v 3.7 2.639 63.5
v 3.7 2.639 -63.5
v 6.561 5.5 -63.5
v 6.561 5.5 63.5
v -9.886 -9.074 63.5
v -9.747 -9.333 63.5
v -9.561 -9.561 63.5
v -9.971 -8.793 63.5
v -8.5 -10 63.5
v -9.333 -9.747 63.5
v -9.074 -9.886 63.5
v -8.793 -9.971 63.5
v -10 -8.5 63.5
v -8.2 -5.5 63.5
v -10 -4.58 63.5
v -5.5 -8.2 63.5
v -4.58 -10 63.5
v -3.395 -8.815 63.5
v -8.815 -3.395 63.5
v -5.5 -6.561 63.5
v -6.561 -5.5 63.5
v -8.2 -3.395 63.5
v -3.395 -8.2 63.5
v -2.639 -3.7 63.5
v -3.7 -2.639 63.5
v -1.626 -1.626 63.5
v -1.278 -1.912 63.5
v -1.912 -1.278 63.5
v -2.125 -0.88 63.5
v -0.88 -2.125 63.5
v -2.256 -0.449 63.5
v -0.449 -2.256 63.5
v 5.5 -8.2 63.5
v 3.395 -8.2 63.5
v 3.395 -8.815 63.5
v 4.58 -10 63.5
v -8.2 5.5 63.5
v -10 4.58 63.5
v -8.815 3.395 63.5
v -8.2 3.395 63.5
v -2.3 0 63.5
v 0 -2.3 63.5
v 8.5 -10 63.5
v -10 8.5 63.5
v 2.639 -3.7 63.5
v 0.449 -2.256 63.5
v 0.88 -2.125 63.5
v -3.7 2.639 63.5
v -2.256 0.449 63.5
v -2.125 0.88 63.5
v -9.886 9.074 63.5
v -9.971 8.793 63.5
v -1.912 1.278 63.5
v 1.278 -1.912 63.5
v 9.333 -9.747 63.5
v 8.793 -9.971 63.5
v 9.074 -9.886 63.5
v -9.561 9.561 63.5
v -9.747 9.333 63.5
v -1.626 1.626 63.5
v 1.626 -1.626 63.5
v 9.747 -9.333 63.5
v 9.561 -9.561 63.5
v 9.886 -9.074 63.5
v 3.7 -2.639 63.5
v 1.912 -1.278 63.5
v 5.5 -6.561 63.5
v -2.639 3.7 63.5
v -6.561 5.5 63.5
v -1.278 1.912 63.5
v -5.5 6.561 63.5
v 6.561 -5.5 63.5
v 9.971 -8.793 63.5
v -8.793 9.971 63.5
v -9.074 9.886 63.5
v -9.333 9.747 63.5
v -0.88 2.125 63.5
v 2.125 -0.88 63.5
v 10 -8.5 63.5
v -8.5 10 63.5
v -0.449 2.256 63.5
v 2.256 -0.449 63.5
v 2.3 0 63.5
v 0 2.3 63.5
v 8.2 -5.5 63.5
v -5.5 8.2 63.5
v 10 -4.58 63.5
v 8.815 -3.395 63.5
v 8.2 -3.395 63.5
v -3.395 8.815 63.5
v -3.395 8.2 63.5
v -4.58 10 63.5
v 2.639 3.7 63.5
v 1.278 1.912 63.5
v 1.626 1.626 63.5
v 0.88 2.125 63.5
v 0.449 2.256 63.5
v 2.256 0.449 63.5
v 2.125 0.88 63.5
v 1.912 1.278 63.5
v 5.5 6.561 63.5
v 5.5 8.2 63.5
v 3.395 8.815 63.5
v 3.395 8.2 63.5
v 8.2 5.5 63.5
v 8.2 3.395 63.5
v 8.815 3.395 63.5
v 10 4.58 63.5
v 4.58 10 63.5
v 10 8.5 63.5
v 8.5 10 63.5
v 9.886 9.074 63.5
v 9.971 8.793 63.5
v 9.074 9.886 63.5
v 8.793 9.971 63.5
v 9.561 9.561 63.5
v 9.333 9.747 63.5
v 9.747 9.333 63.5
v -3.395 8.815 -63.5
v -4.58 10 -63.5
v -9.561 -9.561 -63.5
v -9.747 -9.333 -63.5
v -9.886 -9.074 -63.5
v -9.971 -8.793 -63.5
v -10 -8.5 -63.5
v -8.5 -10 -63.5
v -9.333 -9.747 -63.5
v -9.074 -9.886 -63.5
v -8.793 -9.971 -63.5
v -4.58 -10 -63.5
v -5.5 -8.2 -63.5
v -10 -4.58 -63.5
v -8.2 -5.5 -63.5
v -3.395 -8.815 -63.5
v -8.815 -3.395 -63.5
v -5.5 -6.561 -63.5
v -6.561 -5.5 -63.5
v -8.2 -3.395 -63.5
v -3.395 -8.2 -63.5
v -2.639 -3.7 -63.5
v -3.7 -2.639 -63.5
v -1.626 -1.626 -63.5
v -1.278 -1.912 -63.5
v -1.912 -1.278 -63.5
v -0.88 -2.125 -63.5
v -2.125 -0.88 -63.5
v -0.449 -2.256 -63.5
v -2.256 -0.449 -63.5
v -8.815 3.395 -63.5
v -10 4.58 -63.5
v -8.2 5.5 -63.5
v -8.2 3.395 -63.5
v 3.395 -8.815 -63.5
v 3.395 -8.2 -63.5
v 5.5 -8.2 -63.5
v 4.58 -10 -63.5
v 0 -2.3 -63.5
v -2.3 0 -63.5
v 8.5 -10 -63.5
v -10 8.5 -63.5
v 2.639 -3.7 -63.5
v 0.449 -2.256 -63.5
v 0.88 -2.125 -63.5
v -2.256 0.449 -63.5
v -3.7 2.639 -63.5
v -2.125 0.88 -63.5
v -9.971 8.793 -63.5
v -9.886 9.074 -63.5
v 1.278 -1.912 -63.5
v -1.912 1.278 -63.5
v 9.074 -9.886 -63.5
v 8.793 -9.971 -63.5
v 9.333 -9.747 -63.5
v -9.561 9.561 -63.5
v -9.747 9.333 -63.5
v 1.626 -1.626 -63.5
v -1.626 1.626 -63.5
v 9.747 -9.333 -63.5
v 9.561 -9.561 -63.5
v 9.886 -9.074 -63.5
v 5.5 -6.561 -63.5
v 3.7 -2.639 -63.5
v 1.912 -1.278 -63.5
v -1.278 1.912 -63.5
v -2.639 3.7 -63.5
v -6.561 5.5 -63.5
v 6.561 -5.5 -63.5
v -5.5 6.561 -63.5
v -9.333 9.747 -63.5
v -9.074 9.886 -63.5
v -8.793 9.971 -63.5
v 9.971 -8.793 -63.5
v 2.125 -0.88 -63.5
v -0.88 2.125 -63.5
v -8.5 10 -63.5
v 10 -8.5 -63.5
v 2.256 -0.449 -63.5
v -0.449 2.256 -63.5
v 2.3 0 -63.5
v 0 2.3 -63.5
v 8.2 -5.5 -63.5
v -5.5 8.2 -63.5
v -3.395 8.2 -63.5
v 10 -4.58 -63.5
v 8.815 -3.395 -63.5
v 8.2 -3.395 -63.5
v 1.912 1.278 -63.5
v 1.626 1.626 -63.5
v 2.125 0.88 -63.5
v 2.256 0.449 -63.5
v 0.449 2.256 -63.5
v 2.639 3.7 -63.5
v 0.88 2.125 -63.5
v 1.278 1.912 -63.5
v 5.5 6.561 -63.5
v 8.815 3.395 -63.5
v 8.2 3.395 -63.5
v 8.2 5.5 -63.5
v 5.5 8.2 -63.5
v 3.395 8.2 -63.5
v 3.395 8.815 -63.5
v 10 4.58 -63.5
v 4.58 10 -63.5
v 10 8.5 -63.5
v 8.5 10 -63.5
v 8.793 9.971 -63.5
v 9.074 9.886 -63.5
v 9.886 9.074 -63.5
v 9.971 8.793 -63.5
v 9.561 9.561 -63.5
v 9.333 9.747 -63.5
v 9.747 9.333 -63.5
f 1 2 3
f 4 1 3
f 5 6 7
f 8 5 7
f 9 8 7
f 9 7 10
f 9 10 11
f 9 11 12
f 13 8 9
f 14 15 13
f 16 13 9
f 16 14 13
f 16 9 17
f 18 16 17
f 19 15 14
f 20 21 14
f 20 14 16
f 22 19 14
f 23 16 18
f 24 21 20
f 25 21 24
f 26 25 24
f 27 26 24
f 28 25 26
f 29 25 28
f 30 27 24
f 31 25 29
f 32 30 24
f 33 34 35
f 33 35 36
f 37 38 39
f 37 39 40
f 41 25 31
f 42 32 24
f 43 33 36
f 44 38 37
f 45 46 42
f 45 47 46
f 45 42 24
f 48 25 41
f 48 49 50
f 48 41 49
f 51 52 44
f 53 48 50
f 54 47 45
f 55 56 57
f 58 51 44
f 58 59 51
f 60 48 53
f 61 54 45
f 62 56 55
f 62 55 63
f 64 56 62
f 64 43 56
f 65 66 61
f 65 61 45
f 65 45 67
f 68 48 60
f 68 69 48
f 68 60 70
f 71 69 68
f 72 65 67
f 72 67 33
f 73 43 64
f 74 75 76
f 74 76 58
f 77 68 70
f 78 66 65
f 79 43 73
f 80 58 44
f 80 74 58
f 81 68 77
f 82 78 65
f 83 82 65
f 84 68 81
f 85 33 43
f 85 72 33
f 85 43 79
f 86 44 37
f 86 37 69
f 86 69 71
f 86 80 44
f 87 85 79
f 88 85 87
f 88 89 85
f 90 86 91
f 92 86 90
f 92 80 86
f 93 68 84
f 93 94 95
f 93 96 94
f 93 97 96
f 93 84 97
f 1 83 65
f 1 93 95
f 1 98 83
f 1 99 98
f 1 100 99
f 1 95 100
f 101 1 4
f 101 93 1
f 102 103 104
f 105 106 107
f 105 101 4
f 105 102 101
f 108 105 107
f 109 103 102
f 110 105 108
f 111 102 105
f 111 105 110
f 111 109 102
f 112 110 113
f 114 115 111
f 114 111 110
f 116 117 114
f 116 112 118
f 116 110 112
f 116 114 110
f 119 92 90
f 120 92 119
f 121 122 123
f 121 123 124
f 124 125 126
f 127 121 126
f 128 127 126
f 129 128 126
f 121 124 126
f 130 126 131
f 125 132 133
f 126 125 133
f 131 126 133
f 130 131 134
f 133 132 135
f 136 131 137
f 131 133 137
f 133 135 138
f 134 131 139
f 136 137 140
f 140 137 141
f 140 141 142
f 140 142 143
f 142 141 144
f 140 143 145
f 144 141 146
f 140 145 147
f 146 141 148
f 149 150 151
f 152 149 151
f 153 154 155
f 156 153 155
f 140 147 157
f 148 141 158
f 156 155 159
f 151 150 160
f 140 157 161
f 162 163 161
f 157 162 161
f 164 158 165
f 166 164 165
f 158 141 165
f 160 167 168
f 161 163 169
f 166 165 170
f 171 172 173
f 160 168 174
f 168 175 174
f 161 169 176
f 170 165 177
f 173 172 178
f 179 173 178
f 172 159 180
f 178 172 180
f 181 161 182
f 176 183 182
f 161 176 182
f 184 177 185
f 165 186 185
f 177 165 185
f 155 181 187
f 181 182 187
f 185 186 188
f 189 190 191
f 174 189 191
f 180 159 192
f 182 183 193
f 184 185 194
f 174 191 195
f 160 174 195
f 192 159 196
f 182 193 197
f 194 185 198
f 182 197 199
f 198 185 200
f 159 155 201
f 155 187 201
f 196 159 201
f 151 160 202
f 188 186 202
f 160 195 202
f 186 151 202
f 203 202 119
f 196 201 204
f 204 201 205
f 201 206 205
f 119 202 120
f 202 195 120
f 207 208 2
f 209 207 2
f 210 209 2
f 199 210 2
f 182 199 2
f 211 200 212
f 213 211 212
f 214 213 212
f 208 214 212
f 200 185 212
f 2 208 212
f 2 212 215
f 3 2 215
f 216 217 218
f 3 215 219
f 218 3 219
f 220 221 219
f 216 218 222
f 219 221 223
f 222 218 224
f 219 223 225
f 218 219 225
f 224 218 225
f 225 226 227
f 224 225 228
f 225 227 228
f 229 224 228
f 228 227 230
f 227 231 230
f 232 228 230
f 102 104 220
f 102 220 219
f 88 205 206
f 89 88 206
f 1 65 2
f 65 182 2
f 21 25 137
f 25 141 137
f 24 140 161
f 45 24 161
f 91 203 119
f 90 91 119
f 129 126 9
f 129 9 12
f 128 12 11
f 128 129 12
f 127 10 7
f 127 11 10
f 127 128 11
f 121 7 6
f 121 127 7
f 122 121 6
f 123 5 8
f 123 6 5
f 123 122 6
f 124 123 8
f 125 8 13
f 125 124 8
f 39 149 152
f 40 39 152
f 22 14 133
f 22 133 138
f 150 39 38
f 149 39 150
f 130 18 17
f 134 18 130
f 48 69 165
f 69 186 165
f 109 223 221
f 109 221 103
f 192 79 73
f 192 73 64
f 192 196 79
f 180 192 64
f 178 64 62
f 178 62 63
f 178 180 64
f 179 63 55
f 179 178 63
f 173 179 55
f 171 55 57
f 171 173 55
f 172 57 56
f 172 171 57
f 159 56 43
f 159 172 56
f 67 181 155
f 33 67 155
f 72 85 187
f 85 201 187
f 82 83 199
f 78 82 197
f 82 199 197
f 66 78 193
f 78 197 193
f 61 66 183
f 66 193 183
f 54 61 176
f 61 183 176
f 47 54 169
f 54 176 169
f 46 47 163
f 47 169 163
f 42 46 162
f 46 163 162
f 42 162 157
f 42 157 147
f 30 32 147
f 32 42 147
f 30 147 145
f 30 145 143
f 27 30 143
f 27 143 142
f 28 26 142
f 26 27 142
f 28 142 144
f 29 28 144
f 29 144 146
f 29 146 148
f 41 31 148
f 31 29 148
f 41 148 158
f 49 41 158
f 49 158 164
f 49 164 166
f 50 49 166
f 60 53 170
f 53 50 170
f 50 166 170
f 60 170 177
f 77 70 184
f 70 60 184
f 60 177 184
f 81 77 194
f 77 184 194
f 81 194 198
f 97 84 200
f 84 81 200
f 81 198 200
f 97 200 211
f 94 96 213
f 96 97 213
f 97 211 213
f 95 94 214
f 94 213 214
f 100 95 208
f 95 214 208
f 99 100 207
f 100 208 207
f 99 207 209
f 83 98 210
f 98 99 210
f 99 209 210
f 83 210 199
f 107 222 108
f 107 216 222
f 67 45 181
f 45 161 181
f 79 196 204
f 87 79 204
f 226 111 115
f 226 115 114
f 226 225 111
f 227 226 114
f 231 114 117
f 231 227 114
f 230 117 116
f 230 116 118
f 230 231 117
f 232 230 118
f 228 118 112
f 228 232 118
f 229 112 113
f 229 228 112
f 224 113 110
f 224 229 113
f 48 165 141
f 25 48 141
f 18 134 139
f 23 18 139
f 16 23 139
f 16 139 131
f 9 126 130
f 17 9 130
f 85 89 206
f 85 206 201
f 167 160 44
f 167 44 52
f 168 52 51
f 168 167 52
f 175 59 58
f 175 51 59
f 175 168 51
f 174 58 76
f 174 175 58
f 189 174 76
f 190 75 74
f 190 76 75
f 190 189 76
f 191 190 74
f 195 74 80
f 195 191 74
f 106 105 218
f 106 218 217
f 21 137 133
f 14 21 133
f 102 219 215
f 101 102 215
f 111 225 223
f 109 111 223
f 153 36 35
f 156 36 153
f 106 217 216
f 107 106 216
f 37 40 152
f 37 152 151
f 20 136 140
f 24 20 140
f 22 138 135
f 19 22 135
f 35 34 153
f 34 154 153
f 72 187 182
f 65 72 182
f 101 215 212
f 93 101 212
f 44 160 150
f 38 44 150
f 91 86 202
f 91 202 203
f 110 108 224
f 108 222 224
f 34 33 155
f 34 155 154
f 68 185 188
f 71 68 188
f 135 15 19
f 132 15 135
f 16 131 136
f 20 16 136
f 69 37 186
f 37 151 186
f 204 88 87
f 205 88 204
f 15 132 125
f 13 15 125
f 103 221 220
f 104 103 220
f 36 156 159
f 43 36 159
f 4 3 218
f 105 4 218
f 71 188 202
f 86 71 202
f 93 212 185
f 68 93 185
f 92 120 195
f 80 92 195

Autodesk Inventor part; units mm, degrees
ref_plane "YZ Plane" through (0, 0, 0) normal (1, 0, 0) x (0, 1, 0)
ref_plane "XZ Plane" through (0, 0, 0) normal (0, 1, 0) x (-1, 0, 0)
ref_plane "XY Plane" through (0, 0, 0) normal (0, 0, 1) x (1, 0, 0)
sketch "Sketch1" plane through (0, 0, 0) normal (0, 0, 1) x (1, 0, 0)
  line L0 (0, 3.7) -> (-2.6393, 3.7)
  line L1 (-2.6393, 3.7) -> (-5.5, 6.5607)
  line L2 (-5.5, 6.5607) -> (-5.5, 8.2)
  line L3 (-5.5, 8.2) -> (-3.395, 8.2)
  line L4 (-3.395, 8.2) -> (-3.395, 10)
  line L5 (-3.395, 10) -> (-10, 10)
  line L6 (-10, 10) -> (-10, 3.395)
  line L7 (-10, 3.395) -> (-8.2, 3.395)
  line L8 (-8.2, 3.395) -> (-8.2, 5.5)
  line L9 (-8.2, 5.5) -> (-6.5607, 5.5)
  line L10 (-6.5607, 5.5) -> (-3.7, 2.6393)
  line L11 (-3.7, 2.6393) -> (-3.7, 0)
  line L12 (0, 0) -> (-10, 10) construction
  circle A0 centre (0, 0) radius 2.3
  line L13 (-22.6601, 0) -> (65.9605, 0) projected
  line L14 (-3.7, 0) -> (0, 0)
  line L15 (0, 0) -> (0, 3.7)
  line L16 (11.2521, 18.9743) -> (53.3004, 18.9743) construction
  line L17 (53.3004, 18.9743) -> (53.3004, -5.624) construction
  line L18 (53.3004, -5.624) -> (11.2521, -5.624) construction
  line L19 (11.2521, -5.624) -> (11.2521, 18.9743) construction
  point P0 (-2.3, 0)
  point P1 (0, 2.3)
  dimension "d0" = 1.5
  dimension "d6" = 6.3
  dimension "d9" = 4.6
  dimension "d18" = 135
  dimension "d22" = 20
  dimension "d34" = 11
  dimension "d35" = 6.79
  dimension "d36" = 1.8
extrude "Extrusion1" add sketch "Sketch1" along normal mid plane 127 contours L15 A0 L13 L11 L10 L9 L8 L7 L6 L5 L4 L3 L2 L1 L0
pattern_circular "Circular Pattern1" count 4 over 360 about axis through (0, 0, -10) along (0, 0, 1) of "Extrusion1"
chamfer "Chamfer1" distance 1.185 angle 45 8 edges at (-3.395, 10, 0) (3.395, 10, 0) (10, 3.395, 0) (10, -3.395, 0) (3.395, -10, 0) (-3.395, -10, 0) (-10, -3.395, 0) (-10, 3.395, 0)
fillet "Fillet1" radius 1.5 4 edges at (-10, 10, 0) (10, 10, 0) (-10, -10, 0) (10, -10, 0)
equation "\"d24\" = Zaxis"
equation "\"GridProcutClearance\" = 3"
equation "\"GridBorderThickness\" = 5"
equation "\"GridBorderFillets\" = 7"
equation "\"GridTotalSize\" = 63"
equation "\"BaseTotalWidth\" = 412"
equation "\"BaseTotalLength\" = 624"
equation "\"DistanceBetweenGrid\" = 5"
equation "\"WorkspaceLength\" = 395"
equation "\"WorkspaceWidth\" = 332"
equation "\"AxesBaseFillet\" = 15"
equation "\"Zaxis\" = 127"
properties part number "2020aluminum_extrusion_black" material "Aluminum 6061"
